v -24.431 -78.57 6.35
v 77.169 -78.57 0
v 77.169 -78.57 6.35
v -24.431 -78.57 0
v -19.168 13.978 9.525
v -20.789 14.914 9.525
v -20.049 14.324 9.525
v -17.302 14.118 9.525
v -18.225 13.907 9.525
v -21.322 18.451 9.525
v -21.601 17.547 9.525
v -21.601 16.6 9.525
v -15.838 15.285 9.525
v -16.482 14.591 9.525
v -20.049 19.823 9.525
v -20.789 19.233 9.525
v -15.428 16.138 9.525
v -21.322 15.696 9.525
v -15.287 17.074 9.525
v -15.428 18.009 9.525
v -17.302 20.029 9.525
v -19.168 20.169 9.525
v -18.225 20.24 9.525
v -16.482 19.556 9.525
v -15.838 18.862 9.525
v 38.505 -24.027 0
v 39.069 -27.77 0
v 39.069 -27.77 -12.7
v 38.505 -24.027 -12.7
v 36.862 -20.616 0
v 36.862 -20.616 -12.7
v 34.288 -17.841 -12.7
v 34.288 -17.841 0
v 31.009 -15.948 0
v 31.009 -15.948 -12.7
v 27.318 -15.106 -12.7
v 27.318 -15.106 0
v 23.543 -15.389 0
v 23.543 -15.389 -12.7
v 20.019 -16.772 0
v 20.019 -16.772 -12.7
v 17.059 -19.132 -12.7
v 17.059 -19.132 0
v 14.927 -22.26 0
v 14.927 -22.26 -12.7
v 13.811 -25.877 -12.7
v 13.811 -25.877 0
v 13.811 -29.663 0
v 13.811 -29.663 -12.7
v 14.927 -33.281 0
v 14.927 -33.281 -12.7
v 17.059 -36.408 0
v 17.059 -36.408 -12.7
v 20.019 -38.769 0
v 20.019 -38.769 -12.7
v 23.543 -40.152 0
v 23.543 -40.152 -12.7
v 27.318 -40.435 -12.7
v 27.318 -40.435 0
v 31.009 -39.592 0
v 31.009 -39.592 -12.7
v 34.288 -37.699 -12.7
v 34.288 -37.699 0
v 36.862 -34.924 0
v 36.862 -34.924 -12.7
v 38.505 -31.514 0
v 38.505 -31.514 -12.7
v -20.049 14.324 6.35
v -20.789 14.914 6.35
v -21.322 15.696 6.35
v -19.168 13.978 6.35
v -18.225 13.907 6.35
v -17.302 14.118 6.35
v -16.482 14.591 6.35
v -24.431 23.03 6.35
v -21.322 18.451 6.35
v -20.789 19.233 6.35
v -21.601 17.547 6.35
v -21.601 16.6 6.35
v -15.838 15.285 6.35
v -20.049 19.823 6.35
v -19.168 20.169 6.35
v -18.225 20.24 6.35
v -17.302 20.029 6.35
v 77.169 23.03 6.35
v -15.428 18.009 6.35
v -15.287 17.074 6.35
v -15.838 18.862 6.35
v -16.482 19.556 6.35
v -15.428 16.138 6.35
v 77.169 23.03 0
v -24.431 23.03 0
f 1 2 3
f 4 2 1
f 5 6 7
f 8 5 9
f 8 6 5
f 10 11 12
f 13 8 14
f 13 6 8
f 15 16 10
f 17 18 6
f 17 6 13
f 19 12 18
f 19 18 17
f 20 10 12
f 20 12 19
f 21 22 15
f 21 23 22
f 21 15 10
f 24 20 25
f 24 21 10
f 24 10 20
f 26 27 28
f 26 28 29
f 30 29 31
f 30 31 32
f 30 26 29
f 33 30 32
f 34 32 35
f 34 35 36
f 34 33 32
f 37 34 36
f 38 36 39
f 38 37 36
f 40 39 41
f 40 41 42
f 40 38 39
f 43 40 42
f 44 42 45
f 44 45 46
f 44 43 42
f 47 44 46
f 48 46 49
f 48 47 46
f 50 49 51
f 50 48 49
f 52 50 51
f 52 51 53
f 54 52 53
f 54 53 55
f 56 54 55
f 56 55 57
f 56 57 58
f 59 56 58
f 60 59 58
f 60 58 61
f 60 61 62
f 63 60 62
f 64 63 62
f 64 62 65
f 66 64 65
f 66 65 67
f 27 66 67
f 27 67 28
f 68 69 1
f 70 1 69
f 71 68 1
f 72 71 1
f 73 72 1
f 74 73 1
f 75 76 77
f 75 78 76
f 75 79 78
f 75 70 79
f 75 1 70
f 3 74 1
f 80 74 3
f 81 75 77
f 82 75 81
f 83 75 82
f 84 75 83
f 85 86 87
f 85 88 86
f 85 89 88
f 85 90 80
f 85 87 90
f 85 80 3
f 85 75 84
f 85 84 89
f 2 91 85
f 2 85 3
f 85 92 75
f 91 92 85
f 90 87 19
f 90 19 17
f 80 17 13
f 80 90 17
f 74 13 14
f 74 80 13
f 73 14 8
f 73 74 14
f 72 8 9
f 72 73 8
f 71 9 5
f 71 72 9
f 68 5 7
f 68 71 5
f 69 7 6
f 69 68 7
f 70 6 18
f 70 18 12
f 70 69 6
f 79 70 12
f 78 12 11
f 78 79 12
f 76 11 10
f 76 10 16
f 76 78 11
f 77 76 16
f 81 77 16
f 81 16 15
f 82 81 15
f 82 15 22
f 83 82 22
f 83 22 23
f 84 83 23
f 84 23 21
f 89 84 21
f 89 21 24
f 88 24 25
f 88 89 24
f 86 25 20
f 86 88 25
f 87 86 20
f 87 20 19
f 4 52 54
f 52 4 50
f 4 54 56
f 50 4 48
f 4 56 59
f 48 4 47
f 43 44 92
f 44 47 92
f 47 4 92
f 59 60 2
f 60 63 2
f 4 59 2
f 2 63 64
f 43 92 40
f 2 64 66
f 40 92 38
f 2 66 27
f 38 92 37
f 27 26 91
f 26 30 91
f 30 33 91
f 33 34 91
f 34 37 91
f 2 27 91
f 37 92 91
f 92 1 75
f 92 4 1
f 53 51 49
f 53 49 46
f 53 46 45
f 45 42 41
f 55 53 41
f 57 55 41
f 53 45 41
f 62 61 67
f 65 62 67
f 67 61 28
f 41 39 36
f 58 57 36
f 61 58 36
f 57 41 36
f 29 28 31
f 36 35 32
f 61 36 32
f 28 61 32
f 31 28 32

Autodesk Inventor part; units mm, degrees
ref_plane "YZ Plane" through (0, 0, 0) normal (1, 0, 0) x (0, 1, 0)
ref_plane "XZ Plane" through (0, 0, 0) normal (0, 1, 0) x (-1, 0, 0)
ref_plane "XY Plane" through (0, 0, 0) normal (0, 0, 1) x (1, 0, 0)
sketch "Sketch1" plane through (0, 0, 0) normal (0, 0, 1) x (1, 0, 0)
  line L0 (-24.4308, 23.0298) -> (77.1692, 23.0298)
  line L1 (77.1692, 23.0298) -> (77.1692, -78.5702)
  line L2 (77.1692, -78.5702) -> (-24.4308, -78.5702)
  line L3 (-24.4308, -78.5702) -> (-24.4308, 23.0298)
  point P0 (0, 0)
  dimension "d0" = 101.6
  dimension "d1" = 101.6
extrude "Extrusion1" add sketch "Sketch1" along normal blind 6.35
sketch "Sketch2" plane through (0, 0, 6.35) normal (0, 0, 1) x (1, 0, 0)
  line L0 (-24.4308, 23.0298) -> (26.3692, 23.0298)
  line L1 (26.3692, 23.0298) -> (26.3692, -27.7702)
  line L2 (26.3692, -27.7702) -> (-24.4308, -27.7702)
  line L3 (-24.4308, -27.7702) -> (-24.4308, 23.0298)
  circle A0 centre (26.3692, -27.7702) radius 12.7
  point P0 (0, 0)
  dimension "d4" = 50.8
  dimension "d5" = 50.8
  dimension "d6" = 25.4
extrude "Extrusion2" cut sketch "Sketch2" against normal blind 6.35 contours A0 L2 L1 | L1 L2 A0
sketch "Sketch3" plane through (0, 0, 6.35) normal (0, 0, 1) x (1, 0, 0)
  line L0 (-24.4308, 23.0298) -> (77.1692, 23.0298) projected
  line L1 (-24.4308, -78.5702) -> (-24.4308, 23.0298) projected
  line L2 (-24.4308, 23.0298) -> (-24.4308, -27.7702)
  line L3 (-24.4308, -27.7702) -> (-24.4308, 11.9935)
  line L4 (-24.4308, 11.9935) -> (-13.3818, 11.9935)
  line L5 (-13.3818, 11.9935) -> (-13.3818, 23.0298)
  line L6 (-13.3818, 23.0298) -> (-24.4308, 23.0298)
  line L7 (-24.4308, 23.0298) -> (-24.4308, 11.9935)
  circle A0 centre (-13.3818, 11.9935) radius 3.175
  point P0 (0, 0)
  dimension "d9" = 50.8
  dimension "d10" = 39.7637
  dimension "d11" = 11.049
  dimension "d12" = 6.35
extrude "Extrusion3" add sketch "Sketch3" along normal blind 6.35 contours A0 L4 L5 | L5 L4 A0
sketch "Sketch4" plane through (0, 0, 6.35) normal (0, 0, 1) x (1, 0, 0)
  circle A0 centre (26.3692, -27.7702) radius 12.7 projected
  point P0 (0, 0)
extrude "Extrusion4" add sketch "Sketch4" against normal blind 19.05
sketch "Sketch5" plane through (0, 0, 6.35) normal (0, 0, 1) x (1, 0, 0)
  line L0 (-24.4308, -78.5702) -> (-24.4308, 23.0298) projected
  line L1 (-24.4308, 23.0298) -> (-24.4308, -27.7702)
  line L2 (-24.4308, -27.7702) -> (-24.4308, 17.0735)
  line L3 (-24.4308, 23.0298) -> (-18.4618, 23.0298)
  line L4 (-18.4618, 23.0298) -> (-18.4618, 17.0735)
  line L5 (-18.4618, 17.0735) -> (-24.4308, 17.0735)
  line L6 (-24.4308, 17.0735) -> (-24.4308, 23.0298)
  circle A0 centre (-18.4618, 17.0735) radius 3.175
  point P0 (0, 0)
  dimension "d17" = 50.8
  dimension "d18" = 44.8437
  dimension "d19" = 5.969
  dimension "d20" = 6.35
extrude "Extrusion5" add sketch "Sketch5" along normal blind 3.175 contours A0 L4 L5 | L5 L4 A0
sketch "Sketch6" plane through (-13.3818, 11.9935, 12.7) normal (0, 0, 1) x (1, 0, 0)
  circle A0 centre (0, 0) radius 3.175 projected
  point P0 (13.3818, -11.9935)
extrude "Extrusion6" cut sketch "Sketch6" against normal blind 6.35
properties part number "lasiness"
